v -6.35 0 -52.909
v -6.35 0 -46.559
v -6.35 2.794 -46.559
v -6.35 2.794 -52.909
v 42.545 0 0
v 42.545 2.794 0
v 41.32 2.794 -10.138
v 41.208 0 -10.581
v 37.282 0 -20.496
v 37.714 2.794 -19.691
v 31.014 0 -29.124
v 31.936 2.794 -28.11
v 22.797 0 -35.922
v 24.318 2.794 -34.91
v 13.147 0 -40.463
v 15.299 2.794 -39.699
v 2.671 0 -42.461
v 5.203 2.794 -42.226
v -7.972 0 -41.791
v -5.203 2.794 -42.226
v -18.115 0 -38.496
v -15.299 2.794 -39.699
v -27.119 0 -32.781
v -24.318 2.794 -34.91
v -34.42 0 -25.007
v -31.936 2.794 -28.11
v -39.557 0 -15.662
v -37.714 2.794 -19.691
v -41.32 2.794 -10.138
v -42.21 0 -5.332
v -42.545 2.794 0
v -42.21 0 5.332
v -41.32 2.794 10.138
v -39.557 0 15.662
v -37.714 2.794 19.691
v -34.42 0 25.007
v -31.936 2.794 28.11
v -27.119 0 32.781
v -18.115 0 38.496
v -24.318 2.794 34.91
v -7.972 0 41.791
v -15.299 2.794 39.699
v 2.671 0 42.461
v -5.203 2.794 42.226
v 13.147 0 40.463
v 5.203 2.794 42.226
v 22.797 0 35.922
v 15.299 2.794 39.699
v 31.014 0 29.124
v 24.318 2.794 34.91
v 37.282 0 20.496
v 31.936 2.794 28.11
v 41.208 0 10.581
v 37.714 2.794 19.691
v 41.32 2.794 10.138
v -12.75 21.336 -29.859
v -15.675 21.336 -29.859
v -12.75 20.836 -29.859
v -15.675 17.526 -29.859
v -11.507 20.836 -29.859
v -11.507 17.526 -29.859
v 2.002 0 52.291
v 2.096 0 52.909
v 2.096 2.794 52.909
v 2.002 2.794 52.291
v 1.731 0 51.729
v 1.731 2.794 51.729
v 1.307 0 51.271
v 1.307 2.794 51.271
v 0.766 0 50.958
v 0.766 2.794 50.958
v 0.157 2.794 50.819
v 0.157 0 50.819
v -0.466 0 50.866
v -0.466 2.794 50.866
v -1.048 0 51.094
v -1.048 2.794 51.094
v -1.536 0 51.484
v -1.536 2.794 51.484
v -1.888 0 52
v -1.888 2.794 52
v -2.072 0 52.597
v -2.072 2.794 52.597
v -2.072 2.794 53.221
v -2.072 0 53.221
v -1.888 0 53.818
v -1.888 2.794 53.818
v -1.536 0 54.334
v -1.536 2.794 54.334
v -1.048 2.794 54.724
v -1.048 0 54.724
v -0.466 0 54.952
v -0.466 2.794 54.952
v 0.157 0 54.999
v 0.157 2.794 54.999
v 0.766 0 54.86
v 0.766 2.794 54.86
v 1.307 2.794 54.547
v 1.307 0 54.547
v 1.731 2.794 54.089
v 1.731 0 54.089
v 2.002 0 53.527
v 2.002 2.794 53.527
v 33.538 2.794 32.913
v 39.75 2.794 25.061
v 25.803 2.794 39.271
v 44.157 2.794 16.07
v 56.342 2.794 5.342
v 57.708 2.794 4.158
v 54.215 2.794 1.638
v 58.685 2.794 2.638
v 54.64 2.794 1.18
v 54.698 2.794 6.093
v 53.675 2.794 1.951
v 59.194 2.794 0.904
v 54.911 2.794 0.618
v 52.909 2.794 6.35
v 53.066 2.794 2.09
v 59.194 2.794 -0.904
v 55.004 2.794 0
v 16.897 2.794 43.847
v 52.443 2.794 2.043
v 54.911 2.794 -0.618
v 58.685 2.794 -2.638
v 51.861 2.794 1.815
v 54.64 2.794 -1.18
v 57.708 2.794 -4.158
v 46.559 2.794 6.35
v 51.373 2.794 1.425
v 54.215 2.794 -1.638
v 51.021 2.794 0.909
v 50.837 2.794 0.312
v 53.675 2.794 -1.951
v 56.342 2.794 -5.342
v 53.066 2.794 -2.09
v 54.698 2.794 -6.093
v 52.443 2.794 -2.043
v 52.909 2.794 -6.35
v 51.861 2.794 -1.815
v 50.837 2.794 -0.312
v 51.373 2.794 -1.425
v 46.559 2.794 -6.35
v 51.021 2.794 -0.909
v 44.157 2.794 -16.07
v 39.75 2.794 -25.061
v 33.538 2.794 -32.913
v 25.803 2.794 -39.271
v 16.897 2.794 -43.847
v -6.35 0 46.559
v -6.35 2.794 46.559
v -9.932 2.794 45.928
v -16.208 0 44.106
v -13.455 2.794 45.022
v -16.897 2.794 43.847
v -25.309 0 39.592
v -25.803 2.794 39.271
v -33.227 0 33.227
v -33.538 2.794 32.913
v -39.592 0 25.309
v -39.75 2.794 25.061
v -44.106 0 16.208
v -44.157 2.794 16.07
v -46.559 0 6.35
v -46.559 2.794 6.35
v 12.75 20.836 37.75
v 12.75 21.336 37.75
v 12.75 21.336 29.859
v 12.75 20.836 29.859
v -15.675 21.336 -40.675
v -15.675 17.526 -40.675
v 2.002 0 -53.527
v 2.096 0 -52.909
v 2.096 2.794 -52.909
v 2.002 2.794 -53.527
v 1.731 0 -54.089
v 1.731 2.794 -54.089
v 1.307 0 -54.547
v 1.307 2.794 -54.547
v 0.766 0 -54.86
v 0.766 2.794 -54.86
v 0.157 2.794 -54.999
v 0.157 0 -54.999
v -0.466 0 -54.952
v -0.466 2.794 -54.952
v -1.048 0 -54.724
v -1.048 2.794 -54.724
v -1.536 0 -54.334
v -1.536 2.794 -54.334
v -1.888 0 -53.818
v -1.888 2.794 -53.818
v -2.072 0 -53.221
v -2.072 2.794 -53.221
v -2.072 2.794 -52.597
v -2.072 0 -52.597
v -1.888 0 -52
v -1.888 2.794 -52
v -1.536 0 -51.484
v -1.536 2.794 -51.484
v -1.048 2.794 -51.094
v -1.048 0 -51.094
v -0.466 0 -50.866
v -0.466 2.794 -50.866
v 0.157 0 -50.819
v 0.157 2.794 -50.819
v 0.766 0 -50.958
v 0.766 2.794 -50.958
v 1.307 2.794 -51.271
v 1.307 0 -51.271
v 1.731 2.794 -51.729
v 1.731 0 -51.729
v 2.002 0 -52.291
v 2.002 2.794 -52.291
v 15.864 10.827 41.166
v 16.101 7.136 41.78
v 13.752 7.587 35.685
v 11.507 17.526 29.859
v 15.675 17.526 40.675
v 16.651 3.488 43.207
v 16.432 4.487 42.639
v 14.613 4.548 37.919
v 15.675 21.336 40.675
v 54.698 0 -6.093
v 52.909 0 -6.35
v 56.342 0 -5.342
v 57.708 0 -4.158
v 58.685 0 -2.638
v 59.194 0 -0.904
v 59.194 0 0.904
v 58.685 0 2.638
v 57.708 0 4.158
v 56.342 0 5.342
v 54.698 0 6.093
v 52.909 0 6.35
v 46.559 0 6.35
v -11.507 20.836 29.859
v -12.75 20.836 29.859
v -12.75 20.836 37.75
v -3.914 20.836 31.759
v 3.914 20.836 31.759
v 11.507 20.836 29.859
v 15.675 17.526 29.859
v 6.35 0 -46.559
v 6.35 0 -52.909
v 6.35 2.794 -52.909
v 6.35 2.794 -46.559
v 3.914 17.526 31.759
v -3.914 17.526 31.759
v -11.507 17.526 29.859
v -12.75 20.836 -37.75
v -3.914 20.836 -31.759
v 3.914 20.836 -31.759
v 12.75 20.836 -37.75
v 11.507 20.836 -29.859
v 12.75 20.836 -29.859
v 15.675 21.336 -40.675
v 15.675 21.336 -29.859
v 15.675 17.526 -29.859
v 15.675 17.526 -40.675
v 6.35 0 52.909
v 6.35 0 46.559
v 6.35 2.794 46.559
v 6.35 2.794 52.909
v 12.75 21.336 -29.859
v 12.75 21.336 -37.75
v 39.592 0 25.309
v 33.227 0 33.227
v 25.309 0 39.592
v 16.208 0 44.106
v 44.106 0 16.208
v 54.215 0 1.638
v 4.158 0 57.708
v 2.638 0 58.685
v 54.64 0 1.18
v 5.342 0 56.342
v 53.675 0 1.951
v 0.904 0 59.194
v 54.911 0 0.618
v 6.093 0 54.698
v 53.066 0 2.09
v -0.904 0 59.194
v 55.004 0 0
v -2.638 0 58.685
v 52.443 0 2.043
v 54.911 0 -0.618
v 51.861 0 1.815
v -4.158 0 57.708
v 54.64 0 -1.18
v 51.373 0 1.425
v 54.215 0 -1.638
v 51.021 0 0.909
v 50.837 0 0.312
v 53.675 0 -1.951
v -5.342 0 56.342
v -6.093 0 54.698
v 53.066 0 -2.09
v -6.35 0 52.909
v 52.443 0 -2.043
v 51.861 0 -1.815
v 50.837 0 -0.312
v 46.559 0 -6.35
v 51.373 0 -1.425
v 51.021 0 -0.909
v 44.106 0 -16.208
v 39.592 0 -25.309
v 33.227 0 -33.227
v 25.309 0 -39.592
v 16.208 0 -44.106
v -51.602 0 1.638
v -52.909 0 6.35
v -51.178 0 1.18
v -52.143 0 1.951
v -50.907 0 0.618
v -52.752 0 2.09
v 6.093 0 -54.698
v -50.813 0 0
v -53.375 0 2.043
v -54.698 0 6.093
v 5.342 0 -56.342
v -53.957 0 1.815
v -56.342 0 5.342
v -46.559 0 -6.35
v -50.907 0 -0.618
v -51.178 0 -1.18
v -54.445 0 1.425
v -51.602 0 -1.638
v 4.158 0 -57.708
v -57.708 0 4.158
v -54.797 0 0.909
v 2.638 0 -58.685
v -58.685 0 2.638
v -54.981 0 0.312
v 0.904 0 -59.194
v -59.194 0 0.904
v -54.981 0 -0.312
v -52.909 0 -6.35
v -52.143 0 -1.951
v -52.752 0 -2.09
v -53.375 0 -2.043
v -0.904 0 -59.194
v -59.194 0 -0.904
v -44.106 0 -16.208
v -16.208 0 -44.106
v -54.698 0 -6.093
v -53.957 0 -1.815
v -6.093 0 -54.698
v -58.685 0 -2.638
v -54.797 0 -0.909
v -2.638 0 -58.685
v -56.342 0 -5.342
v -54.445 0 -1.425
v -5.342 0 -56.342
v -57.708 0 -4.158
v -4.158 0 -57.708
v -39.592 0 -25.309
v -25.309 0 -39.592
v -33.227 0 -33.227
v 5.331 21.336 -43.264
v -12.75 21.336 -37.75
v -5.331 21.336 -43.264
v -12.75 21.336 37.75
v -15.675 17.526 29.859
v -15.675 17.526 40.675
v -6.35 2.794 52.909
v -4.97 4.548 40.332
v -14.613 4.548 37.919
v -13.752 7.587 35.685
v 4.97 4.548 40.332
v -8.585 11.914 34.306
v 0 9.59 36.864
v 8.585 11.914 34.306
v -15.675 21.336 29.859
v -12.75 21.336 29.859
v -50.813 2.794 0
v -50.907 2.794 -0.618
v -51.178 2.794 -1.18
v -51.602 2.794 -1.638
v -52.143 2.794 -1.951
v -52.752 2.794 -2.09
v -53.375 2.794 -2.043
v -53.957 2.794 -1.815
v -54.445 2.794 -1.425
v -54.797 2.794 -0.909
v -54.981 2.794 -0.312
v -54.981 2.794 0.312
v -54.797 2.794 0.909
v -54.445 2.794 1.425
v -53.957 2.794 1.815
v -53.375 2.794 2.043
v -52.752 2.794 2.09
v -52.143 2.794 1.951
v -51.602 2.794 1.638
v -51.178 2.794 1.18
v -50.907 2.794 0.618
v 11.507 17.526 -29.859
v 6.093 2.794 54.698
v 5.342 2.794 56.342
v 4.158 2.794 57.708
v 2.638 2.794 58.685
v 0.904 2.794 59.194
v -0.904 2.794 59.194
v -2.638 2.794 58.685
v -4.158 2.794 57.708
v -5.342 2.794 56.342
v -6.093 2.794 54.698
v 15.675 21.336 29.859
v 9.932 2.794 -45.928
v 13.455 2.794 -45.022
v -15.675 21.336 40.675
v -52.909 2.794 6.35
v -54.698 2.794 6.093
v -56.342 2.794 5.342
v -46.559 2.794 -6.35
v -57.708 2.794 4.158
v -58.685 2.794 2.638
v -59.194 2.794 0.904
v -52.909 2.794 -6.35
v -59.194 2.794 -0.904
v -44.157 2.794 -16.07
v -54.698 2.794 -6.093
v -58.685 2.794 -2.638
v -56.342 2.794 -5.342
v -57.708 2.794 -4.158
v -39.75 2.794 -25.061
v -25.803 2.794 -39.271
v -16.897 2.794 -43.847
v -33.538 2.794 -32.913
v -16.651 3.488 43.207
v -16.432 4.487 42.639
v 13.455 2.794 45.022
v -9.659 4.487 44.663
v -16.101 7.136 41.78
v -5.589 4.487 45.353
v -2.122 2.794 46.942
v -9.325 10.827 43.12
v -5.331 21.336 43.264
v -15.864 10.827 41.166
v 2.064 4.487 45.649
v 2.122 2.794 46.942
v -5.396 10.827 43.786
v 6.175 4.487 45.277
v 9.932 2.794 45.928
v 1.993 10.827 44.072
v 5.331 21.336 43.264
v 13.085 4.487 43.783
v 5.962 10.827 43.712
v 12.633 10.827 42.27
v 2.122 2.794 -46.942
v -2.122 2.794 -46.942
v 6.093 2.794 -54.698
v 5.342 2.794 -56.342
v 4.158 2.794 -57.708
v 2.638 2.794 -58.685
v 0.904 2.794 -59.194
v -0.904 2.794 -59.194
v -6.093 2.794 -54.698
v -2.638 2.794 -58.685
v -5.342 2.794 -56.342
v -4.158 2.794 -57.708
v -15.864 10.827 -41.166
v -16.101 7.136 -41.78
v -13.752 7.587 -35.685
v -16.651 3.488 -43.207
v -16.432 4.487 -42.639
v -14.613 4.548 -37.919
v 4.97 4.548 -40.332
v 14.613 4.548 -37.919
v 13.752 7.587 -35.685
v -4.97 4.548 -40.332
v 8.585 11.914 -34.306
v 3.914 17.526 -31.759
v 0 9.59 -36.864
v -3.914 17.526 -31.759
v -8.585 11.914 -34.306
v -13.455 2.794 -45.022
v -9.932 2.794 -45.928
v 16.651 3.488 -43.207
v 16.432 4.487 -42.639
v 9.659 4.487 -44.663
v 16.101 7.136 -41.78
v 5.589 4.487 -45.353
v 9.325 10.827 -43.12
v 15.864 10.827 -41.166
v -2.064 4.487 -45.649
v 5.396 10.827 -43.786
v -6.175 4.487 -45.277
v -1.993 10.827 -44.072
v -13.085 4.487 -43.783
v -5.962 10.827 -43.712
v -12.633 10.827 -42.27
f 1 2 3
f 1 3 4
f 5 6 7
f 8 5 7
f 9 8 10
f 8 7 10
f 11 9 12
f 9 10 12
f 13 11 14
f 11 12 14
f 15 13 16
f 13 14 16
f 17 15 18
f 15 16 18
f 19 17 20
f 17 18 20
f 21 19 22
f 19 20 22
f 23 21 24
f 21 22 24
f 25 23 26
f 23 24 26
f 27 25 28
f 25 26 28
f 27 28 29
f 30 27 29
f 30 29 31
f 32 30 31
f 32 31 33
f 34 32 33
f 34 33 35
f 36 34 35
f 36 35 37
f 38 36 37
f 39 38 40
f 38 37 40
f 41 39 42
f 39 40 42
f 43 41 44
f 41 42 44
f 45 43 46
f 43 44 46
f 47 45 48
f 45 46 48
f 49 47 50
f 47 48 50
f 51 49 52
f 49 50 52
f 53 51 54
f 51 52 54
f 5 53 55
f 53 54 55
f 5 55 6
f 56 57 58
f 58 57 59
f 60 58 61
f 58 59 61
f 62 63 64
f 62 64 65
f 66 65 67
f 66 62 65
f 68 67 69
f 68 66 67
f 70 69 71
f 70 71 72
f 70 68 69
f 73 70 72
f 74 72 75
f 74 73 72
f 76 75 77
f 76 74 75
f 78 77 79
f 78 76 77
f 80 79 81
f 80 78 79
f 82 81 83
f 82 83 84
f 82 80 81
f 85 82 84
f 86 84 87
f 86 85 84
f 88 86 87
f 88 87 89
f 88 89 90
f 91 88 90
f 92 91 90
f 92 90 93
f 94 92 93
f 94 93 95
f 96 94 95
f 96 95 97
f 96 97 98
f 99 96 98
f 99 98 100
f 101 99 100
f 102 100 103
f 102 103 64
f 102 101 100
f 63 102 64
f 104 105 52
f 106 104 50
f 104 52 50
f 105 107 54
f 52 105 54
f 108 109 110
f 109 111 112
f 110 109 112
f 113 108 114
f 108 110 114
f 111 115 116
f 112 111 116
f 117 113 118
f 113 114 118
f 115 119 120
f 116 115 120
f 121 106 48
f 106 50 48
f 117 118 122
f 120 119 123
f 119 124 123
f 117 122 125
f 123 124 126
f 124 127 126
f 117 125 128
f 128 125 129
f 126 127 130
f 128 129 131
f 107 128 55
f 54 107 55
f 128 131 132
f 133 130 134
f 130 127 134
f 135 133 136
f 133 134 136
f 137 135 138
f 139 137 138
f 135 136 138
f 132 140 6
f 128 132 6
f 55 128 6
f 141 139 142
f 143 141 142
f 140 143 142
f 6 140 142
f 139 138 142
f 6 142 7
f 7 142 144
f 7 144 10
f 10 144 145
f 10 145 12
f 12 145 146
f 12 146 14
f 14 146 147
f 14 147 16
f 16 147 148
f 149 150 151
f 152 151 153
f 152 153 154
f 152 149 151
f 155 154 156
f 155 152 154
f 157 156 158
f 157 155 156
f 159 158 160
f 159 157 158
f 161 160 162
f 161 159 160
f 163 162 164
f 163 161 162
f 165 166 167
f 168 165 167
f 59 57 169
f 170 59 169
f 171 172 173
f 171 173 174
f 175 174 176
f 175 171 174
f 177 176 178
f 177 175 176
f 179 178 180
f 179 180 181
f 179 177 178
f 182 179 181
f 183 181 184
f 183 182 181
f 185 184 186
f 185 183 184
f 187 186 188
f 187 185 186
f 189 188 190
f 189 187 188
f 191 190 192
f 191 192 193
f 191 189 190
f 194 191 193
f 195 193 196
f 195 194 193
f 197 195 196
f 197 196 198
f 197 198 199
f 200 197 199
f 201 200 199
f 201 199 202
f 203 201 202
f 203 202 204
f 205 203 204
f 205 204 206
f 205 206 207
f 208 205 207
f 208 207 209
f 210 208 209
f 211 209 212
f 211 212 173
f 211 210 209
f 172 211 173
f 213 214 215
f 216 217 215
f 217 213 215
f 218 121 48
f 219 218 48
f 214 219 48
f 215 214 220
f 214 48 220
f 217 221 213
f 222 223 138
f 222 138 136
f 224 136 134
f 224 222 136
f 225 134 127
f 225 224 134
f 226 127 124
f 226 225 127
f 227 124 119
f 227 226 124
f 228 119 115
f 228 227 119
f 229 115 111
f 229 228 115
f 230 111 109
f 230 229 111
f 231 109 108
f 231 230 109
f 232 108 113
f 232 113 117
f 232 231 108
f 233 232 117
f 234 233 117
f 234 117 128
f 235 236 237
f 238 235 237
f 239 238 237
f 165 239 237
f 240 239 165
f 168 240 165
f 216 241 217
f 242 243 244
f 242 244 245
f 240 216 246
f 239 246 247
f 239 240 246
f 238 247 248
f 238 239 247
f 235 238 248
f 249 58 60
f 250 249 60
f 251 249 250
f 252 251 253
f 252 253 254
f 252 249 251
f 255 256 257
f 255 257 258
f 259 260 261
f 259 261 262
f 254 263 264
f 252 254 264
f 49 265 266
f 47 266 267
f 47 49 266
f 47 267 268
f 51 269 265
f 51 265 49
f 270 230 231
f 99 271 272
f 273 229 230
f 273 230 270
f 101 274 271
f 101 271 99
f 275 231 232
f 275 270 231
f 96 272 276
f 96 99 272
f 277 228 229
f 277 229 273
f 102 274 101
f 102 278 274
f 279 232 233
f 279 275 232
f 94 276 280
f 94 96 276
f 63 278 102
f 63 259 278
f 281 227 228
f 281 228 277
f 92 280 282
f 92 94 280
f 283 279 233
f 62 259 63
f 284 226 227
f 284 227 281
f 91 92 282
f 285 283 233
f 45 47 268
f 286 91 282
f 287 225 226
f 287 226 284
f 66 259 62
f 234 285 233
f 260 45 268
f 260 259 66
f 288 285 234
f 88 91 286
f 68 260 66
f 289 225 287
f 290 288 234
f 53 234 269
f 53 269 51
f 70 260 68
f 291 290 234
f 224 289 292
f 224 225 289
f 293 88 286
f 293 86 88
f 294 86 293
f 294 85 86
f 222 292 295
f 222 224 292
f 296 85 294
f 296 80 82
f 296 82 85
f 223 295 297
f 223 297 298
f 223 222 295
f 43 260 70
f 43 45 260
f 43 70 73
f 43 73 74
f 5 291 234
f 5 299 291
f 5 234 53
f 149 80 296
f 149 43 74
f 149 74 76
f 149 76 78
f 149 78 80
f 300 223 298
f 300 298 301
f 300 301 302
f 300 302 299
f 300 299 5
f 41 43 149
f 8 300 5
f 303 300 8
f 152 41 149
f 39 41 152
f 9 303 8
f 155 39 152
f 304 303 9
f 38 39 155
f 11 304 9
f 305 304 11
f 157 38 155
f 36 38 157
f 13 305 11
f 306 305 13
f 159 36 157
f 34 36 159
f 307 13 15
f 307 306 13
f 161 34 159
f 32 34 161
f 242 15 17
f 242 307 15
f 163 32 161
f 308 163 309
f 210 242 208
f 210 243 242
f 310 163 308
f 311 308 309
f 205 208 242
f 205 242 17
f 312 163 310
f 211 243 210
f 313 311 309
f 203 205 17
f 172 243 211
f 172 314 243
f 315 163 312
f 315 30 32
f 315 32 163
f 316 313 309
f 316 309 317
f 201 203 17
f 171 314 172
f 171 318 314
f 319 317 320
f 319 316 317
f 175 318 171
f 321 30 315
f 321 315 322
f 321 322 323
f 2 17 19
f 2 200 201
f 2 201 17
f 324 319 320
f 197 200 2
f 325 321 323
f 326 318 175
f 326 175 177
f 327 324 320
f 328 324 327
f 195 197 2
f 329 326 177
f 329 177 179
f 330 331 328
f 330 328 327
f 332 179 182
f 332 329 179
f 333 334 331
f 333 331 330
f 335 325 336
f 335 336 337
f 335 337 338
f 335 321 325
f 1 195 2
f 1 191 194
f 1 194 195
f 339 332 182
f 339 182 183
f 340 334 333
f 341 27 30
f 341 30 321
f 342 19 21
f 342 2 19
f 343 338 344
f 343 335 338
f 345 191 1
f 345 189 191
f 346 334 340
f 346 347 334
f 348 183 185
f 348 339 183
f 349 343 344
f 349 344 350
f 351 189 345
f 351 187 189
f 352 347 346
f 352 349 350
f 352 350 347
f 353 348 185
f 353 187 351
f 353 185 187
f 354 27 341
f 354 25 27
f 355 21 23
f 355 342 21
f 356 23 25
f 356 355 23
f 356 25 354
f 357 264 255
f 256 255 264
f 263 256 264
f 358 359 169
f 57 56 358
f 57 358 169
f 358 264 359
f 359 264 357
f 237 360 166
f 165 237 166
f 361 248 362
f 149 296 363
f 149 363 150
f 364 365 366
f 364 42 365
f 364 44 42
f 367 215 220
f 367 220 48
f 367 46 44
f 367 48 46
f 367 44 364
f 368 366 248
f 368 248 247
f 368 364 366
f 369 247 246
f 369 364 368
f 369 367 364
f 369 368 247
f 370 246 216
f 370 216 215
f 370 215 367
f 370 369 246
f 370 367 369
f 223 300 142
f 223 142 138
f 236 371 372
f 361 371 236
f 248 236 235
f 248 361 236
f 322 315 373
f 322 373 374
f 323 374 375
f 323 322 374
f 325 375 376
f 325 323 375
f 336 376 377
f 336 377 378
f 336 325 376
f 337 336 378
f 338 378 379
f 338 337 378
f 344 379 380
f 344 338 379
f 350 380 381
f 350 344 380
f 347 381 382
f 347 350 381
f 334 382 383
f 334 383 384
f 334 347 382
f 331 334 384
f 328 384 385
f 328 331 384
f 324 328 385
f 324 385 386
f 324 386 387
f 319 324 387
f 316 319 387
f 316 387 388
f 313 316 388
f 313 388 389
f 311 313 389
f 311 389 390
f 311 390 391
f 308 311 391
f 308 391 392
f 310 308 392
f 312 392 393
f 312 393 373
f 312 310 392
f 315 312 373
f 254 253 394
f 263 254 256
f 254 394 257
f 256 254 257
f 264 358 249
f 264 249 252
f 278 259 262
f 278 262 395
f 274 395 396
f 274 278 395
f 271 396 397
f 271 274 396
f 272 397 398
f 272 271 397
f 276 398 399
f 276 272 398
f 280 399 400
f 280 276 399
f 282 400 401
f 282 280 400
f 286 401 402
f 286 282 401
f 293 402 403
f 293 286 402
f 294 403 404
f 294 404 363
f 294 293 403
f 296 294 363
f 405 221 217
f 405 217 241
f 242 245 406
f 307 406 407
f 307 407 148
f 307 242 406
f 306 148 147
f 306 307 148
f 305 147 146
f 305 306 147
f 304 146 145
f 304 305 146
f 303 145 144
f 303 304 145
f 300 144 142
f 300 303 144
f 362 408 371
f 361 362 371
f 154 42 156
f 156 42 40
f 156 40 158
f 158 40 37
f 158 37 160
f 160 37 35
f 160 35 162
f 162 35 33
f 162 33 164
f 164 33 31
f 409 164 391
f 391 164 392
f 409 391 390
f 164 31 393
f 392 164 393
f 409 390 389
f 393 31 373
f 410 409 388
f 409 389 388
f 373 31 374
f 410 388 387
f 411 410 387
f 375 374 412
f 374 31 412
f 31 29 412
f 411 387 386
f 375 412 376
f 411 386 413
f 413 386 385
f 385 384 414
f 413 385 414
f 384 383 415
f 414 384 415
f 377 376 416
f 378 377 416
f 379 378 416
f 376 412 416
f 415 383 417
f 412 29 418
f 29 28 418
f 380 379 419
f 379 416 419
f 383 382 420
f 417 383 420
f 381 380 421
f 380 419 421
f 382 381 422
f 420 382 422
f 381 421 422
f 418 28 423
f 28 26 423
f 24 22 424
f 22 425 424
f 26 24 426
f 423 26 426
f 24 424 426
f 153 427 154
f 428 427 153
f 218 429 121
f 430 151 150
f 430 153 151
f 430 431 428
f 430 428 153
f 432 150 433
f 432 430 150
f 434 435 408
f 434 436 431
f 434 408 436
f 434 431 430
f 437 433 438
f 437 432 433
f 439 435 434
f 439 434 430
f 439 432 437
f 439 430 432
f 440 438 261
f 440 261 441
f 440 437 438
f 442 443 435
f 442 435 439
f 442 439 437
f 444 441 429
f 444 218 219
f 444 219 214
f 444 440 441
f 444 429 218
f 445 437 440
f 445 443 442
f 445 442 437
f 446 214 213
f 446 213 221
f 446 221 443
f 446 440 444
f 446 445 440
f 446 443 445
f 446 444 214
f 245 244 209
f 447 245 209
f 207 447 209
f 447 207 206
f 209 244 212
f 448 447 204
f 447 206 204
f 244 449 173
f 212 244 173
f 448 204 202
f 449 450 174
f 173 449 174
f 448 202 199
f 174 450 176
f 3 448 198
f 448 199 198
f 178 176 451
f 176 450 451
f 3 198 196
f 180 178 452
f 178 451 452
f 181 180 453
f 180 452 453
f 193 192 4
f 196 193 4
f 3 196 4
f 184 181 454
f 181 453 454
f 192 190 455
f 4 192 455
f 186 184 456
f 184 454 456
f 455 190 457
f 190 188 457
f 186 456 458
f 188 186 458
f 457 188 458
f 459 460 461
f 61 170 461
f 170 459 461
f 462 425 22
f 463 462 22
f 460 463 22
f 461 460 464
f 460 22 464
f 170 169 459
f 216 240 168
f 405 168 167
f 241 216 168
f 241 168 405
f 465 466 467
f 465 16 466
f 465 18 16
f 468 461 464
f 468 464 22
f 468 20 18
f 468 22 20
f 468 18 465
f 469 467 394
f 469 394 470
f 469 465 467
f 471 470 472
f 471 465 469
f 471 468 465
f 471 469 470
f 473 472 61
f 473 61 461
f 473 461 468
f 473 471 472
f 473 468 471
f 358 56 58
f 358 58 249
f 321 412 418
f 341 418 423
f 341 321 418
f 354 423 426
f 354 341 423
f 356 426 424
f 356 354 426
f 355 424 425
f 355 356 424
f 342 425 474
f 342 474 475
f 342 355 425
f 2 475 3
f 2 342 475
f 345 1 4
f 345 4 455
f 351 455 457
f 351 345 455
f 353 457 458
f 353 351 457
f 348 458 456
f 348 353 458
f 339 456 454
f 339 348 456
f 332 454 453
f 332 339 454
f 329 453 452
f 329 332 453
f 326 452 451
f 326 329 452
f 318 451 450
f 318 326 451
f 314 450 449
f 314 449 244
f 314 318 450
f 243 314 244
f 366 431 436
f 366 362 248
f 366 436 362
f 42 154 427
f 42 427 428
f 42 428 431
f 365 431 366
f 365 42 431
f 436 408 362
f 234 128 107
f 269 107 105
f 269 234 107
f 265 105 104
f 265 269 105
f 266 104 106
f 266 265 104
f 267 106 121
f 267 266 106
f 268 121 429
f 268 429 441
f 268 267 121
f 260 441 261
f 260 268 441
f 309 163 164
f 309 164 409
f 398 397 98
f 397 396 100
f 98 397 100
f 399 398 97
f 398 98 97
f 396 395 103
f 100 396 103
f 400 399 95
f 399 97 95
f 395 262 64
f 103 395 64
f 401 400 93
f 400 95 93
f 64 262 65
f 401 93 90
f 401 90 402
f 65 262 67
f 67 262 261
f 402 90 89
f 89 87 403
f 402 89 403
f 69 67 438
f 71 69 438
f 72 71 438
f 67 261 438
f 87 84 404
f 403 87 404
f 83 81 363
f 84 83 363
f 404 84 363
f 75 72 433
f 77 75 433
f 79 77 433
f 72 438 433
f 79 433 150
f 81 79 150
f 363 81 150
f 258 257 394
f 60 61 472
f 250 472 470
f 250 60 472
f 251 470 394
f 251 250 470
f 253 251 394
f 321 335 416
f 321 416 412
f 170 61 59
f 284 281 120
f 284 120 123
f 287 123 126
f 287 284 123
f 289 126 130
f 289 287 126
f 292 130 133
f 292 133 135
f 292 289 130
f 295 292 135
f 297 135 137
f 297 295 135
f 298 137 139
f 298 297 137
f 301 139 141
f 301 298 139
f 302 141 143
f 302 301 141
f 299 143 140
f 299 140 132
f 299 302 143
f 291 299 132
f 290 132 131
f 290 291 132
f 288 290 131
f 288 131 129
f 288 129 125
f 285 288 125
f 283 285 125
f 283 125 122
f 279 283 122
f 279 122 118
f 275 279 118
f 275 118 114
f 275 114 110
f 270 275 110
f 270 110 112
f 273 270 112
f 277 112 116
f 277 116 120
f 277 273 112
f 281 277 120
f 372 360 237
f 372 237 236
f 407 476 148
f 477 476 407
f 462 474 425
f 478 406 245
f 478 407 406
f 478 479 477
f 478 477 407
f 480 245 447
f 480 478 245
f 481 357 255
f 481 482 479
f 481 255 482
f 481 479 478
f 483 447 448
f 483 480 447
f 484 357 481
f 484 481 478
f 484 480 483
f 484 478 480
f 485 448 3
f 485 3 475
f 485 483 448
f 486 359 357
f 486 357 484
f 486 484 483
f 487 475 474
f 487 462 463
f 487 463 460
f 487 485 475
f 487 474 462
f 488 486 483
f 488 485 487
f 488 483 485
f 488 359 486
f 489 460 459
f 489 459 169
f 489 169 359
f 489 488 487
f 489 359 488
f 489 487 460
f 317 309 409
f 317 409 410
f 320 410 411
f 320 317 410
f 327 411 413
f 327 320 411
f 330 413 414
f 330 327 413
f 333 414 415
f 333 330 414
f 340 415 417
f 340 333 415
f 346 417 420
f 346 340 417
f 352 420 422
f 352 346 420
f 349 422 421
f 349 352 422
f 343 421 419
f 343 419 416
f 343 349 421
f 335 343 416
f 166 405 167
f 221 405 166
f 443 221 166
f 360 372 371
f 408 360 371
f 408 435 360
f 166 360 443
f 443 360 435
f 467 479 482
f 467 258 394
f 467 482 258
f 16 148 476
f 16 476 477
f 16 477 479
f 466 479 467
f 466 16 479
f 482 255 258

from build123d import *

# Parameters (mm, degrees)
SKETCH1_R           = 2.0955
BOSS_EXTRUDE1_DEPTH = 2.794
SKETCH2_R           = 42.545
CUT_EXTRUDE2_DEPTH  = 3.794
SKETCH4_W           = 31.35
SKETCH4_H           = 81.35
BOSS_EXTRUDE3_DEPTH = 3.81
CIRPATTERN1_COUNT   = 2
SKETCH5_W           = 25.5
SKETCH5_H           = 75.5
CUT_EXTRUDE3_DEPTH  = 0.5
CUT_EXTRUDE5_REACH  = 5.81
SKETCH24_W          = 31.35
SKETCH24_H          = 59.718160102
CUT_EXTRUDE6_START  = -3.31
SKETCH25_R          = 31.999566145
CUT_EXTRUDE6_DEPTH  = 3.31


with BuildPart() as part:
    # Sketch1 → Boss-Extrude1 (new body)
    with BuildSketch(Plane(origin=(0, 0, 0), x_dir=(1, 0, 0), z_dir=(0, 1, 0))):
        with BuildLine():
            Line((46.558969061, 6.35), (52.908969061, 6.35))
            ThreePointArc((52.908969061, 6.35), (59.258969061, 0), (52.908969061, -6.35))
            Line((52.908969061, -6.35), (46.558969061, -6.35))
            ThreePointArc((46.558969061, -6.35), (33.226947648, -33.226947648), (6.35, -46.558969061))
            Line((6.35, -46.558969061), (6.35, -52.908969061))
            ThreePointArc((6.35, -52.908969061), (0, -59.258969061), (-6.35, -52.908969061))
            Line((-6.35, -52.908969061), (-6.35, -46.558969061))
            ThreePointArc((-6.35, -46.558969061), (-33.226947648, -33.226947648), (-46.558969061, -6.35))
            Line((-46.558969061, -6.35), (-52.908969061, -6.35))
            ThreePointArc((-52.908969061, -6.35), (-59.258969061, 0), (-52.908969061, 6.35))
            Line((-52.908969061, 6.35), (-46.558969061, 6.35))
            ThreePointArc((-46.558969061, 6.35), (-33.226947648, 33.226947648), (-6.35, 46.558969061))
            Line((-6.35, 46.558969061), (-6.35, 52.908969061))
            ThreePointArc((-6.35, 52.908969061), (0, 59.258969061), (6.35, 52.908969061))
            Line((6.35, 52.908969061), (6.35, 46.558969061))
            ThreePointArc((6.35, 46.558969061), (33.226947648, 33.226947648), (46.558969061, 6.35))
        make_face()
        with Locations((52.908969061, 0)):
            Circle(SKETCH1_R, mode=Mode.SUBTRACT)
        with Locations((0, -52.908969061)):
            Circle(SKETCH1_R, mode=Mode.SUBTRACT)
        with Locations((-52.908969061, 0)):
            Circle(SKETCH1_R, mode=Mode.SUBTRACT)
        with Locations((0, 52.908969061)):
            Circle(SKETCH1_R, mode=Mode.SUBTRACT)
    extrude(amount=BOSS_EXTRUDE1_DEPTH)

    # Sketch2 → Cut-Extrude2 (cut, through all)
    with BuildSketch(Plane(origin=(0, 2.794, 0), x_dir=(1, 0, 0), z_dir=(0, 1, 0))):
        Circle(SKETCH2_R)
    extrude(amount=-CUT_EXTRUDE2_DEPTH, mode=Mode.SUBTRACT)



with BuildPart() as body_2:
    # Sketch4 → Boss-Extrude3 (new body)
    with BuildSketch(Plane(origin=(0, 21.336, 0), x_dir=(-1, 0, 0), z_dir=(0, -1, 0))):
        Rectangle(SKETCH4_W, SKETCH4_H)
    extrude(amount=BOSS_EXTRUDE3_DEPTH)


with BuildPart() as part_1:
    add(part.part)

    add(body_2.part)  # Sweep2 merges body 2
    # Sweep2: sweep along a path in Sketch22
    with BuildLine(Plane(origin=(0, 2.794, 0), x_dir=(1, 0, 0), z_dir=(0, 1, 0))) as sweep2_path:
        ThreePointArc((15.298922649, 39.699118262), (0, 42.545), (-15.298922649, 39.699118262))
    # Sketch6 → Sweep2 (sweep)
    with BuildSketch(Plane(origin=(0, 0, 0), x_dir=(0.359593904, 0, -0.933108903), z_dir=(0.933108903, 0, 0.359593904))):
        with BuildLine():
            Line((46.99, 2.794), (42.545, 2.794))
            add(Edge.make_bspline(
                [(42.545, 2.794), (38.735, 5.334), (29.845, 21.336)],
                knots=[0, 0, 0, 1, 1, 1], degree=2))
            Line((29.845, 21.336), (43.590839061, 21.336))
            add(Edge.make_bspline(
                [(43.590839061, 21.336), (43.590839061, 5.334), (46.99, 2.794)],
                knots=[0, 0, 0, 1, 1, 1], degree=2))
        make_face()
    sweep2 = sweep(path=sweep2_path.line)

    # CirPattern1: Sweep2 ×2 about axis
    cirpattern1_axis = Axis((0, 0, 0), (0, -1, 0))
    for i in range(1, CIRPATTERN1_COUNT):
        add(sweep2.rotate(cirpattern1_axis, i * 360 / CIRPATTERN1_COUNT))

    # Sketch5 → Cut-Extrude3 (cut)
    with BuildSketch(Plane(origin=(0, 21.336, 0), x_dir=(1, 0, 0), z_dir=(0, 1, 0))):
        Rectangle(SKETCH5_W, SKETCH5_H)
    extrude(amount=-CUT_EXTRUDE3_DEPTH, mode=Mode.SUBTRACT)

    # Sketch24 → Cut-Extrude5 (cut, up to next)
    with BuildSketch(Plane.XZ.offset(-17.526), mode=Mode.PRIVATE) as cut_extrude5_sk1:
        Rectangle(SKETCH24_W, SKETCH24_H)
    cut_extrude5_tool1 = extrude(cut_extrude5_sk1.sketch, amount=-CUT_EXTRUDE5_REACH, mode=Mode.PRIVATE) & part_1.part
    add(cut_extrude5_tool1.solids().sort_by_distance((0, 17.526, 0))[0], mode=Mode.SUBTRACT)

    # Sketch25 → Cut-Extrude6 (cut)
    with BuildSketch(Plane.XZ.offset(-17.526).offset(CUT_EXTRUDE6_START)):
        Circle(SKETCH25_R)
    extrude(amount=CUT_EXTRUDE6_DEPTH, mode=Mode.SUBTRACT)


solid = part_1.part
